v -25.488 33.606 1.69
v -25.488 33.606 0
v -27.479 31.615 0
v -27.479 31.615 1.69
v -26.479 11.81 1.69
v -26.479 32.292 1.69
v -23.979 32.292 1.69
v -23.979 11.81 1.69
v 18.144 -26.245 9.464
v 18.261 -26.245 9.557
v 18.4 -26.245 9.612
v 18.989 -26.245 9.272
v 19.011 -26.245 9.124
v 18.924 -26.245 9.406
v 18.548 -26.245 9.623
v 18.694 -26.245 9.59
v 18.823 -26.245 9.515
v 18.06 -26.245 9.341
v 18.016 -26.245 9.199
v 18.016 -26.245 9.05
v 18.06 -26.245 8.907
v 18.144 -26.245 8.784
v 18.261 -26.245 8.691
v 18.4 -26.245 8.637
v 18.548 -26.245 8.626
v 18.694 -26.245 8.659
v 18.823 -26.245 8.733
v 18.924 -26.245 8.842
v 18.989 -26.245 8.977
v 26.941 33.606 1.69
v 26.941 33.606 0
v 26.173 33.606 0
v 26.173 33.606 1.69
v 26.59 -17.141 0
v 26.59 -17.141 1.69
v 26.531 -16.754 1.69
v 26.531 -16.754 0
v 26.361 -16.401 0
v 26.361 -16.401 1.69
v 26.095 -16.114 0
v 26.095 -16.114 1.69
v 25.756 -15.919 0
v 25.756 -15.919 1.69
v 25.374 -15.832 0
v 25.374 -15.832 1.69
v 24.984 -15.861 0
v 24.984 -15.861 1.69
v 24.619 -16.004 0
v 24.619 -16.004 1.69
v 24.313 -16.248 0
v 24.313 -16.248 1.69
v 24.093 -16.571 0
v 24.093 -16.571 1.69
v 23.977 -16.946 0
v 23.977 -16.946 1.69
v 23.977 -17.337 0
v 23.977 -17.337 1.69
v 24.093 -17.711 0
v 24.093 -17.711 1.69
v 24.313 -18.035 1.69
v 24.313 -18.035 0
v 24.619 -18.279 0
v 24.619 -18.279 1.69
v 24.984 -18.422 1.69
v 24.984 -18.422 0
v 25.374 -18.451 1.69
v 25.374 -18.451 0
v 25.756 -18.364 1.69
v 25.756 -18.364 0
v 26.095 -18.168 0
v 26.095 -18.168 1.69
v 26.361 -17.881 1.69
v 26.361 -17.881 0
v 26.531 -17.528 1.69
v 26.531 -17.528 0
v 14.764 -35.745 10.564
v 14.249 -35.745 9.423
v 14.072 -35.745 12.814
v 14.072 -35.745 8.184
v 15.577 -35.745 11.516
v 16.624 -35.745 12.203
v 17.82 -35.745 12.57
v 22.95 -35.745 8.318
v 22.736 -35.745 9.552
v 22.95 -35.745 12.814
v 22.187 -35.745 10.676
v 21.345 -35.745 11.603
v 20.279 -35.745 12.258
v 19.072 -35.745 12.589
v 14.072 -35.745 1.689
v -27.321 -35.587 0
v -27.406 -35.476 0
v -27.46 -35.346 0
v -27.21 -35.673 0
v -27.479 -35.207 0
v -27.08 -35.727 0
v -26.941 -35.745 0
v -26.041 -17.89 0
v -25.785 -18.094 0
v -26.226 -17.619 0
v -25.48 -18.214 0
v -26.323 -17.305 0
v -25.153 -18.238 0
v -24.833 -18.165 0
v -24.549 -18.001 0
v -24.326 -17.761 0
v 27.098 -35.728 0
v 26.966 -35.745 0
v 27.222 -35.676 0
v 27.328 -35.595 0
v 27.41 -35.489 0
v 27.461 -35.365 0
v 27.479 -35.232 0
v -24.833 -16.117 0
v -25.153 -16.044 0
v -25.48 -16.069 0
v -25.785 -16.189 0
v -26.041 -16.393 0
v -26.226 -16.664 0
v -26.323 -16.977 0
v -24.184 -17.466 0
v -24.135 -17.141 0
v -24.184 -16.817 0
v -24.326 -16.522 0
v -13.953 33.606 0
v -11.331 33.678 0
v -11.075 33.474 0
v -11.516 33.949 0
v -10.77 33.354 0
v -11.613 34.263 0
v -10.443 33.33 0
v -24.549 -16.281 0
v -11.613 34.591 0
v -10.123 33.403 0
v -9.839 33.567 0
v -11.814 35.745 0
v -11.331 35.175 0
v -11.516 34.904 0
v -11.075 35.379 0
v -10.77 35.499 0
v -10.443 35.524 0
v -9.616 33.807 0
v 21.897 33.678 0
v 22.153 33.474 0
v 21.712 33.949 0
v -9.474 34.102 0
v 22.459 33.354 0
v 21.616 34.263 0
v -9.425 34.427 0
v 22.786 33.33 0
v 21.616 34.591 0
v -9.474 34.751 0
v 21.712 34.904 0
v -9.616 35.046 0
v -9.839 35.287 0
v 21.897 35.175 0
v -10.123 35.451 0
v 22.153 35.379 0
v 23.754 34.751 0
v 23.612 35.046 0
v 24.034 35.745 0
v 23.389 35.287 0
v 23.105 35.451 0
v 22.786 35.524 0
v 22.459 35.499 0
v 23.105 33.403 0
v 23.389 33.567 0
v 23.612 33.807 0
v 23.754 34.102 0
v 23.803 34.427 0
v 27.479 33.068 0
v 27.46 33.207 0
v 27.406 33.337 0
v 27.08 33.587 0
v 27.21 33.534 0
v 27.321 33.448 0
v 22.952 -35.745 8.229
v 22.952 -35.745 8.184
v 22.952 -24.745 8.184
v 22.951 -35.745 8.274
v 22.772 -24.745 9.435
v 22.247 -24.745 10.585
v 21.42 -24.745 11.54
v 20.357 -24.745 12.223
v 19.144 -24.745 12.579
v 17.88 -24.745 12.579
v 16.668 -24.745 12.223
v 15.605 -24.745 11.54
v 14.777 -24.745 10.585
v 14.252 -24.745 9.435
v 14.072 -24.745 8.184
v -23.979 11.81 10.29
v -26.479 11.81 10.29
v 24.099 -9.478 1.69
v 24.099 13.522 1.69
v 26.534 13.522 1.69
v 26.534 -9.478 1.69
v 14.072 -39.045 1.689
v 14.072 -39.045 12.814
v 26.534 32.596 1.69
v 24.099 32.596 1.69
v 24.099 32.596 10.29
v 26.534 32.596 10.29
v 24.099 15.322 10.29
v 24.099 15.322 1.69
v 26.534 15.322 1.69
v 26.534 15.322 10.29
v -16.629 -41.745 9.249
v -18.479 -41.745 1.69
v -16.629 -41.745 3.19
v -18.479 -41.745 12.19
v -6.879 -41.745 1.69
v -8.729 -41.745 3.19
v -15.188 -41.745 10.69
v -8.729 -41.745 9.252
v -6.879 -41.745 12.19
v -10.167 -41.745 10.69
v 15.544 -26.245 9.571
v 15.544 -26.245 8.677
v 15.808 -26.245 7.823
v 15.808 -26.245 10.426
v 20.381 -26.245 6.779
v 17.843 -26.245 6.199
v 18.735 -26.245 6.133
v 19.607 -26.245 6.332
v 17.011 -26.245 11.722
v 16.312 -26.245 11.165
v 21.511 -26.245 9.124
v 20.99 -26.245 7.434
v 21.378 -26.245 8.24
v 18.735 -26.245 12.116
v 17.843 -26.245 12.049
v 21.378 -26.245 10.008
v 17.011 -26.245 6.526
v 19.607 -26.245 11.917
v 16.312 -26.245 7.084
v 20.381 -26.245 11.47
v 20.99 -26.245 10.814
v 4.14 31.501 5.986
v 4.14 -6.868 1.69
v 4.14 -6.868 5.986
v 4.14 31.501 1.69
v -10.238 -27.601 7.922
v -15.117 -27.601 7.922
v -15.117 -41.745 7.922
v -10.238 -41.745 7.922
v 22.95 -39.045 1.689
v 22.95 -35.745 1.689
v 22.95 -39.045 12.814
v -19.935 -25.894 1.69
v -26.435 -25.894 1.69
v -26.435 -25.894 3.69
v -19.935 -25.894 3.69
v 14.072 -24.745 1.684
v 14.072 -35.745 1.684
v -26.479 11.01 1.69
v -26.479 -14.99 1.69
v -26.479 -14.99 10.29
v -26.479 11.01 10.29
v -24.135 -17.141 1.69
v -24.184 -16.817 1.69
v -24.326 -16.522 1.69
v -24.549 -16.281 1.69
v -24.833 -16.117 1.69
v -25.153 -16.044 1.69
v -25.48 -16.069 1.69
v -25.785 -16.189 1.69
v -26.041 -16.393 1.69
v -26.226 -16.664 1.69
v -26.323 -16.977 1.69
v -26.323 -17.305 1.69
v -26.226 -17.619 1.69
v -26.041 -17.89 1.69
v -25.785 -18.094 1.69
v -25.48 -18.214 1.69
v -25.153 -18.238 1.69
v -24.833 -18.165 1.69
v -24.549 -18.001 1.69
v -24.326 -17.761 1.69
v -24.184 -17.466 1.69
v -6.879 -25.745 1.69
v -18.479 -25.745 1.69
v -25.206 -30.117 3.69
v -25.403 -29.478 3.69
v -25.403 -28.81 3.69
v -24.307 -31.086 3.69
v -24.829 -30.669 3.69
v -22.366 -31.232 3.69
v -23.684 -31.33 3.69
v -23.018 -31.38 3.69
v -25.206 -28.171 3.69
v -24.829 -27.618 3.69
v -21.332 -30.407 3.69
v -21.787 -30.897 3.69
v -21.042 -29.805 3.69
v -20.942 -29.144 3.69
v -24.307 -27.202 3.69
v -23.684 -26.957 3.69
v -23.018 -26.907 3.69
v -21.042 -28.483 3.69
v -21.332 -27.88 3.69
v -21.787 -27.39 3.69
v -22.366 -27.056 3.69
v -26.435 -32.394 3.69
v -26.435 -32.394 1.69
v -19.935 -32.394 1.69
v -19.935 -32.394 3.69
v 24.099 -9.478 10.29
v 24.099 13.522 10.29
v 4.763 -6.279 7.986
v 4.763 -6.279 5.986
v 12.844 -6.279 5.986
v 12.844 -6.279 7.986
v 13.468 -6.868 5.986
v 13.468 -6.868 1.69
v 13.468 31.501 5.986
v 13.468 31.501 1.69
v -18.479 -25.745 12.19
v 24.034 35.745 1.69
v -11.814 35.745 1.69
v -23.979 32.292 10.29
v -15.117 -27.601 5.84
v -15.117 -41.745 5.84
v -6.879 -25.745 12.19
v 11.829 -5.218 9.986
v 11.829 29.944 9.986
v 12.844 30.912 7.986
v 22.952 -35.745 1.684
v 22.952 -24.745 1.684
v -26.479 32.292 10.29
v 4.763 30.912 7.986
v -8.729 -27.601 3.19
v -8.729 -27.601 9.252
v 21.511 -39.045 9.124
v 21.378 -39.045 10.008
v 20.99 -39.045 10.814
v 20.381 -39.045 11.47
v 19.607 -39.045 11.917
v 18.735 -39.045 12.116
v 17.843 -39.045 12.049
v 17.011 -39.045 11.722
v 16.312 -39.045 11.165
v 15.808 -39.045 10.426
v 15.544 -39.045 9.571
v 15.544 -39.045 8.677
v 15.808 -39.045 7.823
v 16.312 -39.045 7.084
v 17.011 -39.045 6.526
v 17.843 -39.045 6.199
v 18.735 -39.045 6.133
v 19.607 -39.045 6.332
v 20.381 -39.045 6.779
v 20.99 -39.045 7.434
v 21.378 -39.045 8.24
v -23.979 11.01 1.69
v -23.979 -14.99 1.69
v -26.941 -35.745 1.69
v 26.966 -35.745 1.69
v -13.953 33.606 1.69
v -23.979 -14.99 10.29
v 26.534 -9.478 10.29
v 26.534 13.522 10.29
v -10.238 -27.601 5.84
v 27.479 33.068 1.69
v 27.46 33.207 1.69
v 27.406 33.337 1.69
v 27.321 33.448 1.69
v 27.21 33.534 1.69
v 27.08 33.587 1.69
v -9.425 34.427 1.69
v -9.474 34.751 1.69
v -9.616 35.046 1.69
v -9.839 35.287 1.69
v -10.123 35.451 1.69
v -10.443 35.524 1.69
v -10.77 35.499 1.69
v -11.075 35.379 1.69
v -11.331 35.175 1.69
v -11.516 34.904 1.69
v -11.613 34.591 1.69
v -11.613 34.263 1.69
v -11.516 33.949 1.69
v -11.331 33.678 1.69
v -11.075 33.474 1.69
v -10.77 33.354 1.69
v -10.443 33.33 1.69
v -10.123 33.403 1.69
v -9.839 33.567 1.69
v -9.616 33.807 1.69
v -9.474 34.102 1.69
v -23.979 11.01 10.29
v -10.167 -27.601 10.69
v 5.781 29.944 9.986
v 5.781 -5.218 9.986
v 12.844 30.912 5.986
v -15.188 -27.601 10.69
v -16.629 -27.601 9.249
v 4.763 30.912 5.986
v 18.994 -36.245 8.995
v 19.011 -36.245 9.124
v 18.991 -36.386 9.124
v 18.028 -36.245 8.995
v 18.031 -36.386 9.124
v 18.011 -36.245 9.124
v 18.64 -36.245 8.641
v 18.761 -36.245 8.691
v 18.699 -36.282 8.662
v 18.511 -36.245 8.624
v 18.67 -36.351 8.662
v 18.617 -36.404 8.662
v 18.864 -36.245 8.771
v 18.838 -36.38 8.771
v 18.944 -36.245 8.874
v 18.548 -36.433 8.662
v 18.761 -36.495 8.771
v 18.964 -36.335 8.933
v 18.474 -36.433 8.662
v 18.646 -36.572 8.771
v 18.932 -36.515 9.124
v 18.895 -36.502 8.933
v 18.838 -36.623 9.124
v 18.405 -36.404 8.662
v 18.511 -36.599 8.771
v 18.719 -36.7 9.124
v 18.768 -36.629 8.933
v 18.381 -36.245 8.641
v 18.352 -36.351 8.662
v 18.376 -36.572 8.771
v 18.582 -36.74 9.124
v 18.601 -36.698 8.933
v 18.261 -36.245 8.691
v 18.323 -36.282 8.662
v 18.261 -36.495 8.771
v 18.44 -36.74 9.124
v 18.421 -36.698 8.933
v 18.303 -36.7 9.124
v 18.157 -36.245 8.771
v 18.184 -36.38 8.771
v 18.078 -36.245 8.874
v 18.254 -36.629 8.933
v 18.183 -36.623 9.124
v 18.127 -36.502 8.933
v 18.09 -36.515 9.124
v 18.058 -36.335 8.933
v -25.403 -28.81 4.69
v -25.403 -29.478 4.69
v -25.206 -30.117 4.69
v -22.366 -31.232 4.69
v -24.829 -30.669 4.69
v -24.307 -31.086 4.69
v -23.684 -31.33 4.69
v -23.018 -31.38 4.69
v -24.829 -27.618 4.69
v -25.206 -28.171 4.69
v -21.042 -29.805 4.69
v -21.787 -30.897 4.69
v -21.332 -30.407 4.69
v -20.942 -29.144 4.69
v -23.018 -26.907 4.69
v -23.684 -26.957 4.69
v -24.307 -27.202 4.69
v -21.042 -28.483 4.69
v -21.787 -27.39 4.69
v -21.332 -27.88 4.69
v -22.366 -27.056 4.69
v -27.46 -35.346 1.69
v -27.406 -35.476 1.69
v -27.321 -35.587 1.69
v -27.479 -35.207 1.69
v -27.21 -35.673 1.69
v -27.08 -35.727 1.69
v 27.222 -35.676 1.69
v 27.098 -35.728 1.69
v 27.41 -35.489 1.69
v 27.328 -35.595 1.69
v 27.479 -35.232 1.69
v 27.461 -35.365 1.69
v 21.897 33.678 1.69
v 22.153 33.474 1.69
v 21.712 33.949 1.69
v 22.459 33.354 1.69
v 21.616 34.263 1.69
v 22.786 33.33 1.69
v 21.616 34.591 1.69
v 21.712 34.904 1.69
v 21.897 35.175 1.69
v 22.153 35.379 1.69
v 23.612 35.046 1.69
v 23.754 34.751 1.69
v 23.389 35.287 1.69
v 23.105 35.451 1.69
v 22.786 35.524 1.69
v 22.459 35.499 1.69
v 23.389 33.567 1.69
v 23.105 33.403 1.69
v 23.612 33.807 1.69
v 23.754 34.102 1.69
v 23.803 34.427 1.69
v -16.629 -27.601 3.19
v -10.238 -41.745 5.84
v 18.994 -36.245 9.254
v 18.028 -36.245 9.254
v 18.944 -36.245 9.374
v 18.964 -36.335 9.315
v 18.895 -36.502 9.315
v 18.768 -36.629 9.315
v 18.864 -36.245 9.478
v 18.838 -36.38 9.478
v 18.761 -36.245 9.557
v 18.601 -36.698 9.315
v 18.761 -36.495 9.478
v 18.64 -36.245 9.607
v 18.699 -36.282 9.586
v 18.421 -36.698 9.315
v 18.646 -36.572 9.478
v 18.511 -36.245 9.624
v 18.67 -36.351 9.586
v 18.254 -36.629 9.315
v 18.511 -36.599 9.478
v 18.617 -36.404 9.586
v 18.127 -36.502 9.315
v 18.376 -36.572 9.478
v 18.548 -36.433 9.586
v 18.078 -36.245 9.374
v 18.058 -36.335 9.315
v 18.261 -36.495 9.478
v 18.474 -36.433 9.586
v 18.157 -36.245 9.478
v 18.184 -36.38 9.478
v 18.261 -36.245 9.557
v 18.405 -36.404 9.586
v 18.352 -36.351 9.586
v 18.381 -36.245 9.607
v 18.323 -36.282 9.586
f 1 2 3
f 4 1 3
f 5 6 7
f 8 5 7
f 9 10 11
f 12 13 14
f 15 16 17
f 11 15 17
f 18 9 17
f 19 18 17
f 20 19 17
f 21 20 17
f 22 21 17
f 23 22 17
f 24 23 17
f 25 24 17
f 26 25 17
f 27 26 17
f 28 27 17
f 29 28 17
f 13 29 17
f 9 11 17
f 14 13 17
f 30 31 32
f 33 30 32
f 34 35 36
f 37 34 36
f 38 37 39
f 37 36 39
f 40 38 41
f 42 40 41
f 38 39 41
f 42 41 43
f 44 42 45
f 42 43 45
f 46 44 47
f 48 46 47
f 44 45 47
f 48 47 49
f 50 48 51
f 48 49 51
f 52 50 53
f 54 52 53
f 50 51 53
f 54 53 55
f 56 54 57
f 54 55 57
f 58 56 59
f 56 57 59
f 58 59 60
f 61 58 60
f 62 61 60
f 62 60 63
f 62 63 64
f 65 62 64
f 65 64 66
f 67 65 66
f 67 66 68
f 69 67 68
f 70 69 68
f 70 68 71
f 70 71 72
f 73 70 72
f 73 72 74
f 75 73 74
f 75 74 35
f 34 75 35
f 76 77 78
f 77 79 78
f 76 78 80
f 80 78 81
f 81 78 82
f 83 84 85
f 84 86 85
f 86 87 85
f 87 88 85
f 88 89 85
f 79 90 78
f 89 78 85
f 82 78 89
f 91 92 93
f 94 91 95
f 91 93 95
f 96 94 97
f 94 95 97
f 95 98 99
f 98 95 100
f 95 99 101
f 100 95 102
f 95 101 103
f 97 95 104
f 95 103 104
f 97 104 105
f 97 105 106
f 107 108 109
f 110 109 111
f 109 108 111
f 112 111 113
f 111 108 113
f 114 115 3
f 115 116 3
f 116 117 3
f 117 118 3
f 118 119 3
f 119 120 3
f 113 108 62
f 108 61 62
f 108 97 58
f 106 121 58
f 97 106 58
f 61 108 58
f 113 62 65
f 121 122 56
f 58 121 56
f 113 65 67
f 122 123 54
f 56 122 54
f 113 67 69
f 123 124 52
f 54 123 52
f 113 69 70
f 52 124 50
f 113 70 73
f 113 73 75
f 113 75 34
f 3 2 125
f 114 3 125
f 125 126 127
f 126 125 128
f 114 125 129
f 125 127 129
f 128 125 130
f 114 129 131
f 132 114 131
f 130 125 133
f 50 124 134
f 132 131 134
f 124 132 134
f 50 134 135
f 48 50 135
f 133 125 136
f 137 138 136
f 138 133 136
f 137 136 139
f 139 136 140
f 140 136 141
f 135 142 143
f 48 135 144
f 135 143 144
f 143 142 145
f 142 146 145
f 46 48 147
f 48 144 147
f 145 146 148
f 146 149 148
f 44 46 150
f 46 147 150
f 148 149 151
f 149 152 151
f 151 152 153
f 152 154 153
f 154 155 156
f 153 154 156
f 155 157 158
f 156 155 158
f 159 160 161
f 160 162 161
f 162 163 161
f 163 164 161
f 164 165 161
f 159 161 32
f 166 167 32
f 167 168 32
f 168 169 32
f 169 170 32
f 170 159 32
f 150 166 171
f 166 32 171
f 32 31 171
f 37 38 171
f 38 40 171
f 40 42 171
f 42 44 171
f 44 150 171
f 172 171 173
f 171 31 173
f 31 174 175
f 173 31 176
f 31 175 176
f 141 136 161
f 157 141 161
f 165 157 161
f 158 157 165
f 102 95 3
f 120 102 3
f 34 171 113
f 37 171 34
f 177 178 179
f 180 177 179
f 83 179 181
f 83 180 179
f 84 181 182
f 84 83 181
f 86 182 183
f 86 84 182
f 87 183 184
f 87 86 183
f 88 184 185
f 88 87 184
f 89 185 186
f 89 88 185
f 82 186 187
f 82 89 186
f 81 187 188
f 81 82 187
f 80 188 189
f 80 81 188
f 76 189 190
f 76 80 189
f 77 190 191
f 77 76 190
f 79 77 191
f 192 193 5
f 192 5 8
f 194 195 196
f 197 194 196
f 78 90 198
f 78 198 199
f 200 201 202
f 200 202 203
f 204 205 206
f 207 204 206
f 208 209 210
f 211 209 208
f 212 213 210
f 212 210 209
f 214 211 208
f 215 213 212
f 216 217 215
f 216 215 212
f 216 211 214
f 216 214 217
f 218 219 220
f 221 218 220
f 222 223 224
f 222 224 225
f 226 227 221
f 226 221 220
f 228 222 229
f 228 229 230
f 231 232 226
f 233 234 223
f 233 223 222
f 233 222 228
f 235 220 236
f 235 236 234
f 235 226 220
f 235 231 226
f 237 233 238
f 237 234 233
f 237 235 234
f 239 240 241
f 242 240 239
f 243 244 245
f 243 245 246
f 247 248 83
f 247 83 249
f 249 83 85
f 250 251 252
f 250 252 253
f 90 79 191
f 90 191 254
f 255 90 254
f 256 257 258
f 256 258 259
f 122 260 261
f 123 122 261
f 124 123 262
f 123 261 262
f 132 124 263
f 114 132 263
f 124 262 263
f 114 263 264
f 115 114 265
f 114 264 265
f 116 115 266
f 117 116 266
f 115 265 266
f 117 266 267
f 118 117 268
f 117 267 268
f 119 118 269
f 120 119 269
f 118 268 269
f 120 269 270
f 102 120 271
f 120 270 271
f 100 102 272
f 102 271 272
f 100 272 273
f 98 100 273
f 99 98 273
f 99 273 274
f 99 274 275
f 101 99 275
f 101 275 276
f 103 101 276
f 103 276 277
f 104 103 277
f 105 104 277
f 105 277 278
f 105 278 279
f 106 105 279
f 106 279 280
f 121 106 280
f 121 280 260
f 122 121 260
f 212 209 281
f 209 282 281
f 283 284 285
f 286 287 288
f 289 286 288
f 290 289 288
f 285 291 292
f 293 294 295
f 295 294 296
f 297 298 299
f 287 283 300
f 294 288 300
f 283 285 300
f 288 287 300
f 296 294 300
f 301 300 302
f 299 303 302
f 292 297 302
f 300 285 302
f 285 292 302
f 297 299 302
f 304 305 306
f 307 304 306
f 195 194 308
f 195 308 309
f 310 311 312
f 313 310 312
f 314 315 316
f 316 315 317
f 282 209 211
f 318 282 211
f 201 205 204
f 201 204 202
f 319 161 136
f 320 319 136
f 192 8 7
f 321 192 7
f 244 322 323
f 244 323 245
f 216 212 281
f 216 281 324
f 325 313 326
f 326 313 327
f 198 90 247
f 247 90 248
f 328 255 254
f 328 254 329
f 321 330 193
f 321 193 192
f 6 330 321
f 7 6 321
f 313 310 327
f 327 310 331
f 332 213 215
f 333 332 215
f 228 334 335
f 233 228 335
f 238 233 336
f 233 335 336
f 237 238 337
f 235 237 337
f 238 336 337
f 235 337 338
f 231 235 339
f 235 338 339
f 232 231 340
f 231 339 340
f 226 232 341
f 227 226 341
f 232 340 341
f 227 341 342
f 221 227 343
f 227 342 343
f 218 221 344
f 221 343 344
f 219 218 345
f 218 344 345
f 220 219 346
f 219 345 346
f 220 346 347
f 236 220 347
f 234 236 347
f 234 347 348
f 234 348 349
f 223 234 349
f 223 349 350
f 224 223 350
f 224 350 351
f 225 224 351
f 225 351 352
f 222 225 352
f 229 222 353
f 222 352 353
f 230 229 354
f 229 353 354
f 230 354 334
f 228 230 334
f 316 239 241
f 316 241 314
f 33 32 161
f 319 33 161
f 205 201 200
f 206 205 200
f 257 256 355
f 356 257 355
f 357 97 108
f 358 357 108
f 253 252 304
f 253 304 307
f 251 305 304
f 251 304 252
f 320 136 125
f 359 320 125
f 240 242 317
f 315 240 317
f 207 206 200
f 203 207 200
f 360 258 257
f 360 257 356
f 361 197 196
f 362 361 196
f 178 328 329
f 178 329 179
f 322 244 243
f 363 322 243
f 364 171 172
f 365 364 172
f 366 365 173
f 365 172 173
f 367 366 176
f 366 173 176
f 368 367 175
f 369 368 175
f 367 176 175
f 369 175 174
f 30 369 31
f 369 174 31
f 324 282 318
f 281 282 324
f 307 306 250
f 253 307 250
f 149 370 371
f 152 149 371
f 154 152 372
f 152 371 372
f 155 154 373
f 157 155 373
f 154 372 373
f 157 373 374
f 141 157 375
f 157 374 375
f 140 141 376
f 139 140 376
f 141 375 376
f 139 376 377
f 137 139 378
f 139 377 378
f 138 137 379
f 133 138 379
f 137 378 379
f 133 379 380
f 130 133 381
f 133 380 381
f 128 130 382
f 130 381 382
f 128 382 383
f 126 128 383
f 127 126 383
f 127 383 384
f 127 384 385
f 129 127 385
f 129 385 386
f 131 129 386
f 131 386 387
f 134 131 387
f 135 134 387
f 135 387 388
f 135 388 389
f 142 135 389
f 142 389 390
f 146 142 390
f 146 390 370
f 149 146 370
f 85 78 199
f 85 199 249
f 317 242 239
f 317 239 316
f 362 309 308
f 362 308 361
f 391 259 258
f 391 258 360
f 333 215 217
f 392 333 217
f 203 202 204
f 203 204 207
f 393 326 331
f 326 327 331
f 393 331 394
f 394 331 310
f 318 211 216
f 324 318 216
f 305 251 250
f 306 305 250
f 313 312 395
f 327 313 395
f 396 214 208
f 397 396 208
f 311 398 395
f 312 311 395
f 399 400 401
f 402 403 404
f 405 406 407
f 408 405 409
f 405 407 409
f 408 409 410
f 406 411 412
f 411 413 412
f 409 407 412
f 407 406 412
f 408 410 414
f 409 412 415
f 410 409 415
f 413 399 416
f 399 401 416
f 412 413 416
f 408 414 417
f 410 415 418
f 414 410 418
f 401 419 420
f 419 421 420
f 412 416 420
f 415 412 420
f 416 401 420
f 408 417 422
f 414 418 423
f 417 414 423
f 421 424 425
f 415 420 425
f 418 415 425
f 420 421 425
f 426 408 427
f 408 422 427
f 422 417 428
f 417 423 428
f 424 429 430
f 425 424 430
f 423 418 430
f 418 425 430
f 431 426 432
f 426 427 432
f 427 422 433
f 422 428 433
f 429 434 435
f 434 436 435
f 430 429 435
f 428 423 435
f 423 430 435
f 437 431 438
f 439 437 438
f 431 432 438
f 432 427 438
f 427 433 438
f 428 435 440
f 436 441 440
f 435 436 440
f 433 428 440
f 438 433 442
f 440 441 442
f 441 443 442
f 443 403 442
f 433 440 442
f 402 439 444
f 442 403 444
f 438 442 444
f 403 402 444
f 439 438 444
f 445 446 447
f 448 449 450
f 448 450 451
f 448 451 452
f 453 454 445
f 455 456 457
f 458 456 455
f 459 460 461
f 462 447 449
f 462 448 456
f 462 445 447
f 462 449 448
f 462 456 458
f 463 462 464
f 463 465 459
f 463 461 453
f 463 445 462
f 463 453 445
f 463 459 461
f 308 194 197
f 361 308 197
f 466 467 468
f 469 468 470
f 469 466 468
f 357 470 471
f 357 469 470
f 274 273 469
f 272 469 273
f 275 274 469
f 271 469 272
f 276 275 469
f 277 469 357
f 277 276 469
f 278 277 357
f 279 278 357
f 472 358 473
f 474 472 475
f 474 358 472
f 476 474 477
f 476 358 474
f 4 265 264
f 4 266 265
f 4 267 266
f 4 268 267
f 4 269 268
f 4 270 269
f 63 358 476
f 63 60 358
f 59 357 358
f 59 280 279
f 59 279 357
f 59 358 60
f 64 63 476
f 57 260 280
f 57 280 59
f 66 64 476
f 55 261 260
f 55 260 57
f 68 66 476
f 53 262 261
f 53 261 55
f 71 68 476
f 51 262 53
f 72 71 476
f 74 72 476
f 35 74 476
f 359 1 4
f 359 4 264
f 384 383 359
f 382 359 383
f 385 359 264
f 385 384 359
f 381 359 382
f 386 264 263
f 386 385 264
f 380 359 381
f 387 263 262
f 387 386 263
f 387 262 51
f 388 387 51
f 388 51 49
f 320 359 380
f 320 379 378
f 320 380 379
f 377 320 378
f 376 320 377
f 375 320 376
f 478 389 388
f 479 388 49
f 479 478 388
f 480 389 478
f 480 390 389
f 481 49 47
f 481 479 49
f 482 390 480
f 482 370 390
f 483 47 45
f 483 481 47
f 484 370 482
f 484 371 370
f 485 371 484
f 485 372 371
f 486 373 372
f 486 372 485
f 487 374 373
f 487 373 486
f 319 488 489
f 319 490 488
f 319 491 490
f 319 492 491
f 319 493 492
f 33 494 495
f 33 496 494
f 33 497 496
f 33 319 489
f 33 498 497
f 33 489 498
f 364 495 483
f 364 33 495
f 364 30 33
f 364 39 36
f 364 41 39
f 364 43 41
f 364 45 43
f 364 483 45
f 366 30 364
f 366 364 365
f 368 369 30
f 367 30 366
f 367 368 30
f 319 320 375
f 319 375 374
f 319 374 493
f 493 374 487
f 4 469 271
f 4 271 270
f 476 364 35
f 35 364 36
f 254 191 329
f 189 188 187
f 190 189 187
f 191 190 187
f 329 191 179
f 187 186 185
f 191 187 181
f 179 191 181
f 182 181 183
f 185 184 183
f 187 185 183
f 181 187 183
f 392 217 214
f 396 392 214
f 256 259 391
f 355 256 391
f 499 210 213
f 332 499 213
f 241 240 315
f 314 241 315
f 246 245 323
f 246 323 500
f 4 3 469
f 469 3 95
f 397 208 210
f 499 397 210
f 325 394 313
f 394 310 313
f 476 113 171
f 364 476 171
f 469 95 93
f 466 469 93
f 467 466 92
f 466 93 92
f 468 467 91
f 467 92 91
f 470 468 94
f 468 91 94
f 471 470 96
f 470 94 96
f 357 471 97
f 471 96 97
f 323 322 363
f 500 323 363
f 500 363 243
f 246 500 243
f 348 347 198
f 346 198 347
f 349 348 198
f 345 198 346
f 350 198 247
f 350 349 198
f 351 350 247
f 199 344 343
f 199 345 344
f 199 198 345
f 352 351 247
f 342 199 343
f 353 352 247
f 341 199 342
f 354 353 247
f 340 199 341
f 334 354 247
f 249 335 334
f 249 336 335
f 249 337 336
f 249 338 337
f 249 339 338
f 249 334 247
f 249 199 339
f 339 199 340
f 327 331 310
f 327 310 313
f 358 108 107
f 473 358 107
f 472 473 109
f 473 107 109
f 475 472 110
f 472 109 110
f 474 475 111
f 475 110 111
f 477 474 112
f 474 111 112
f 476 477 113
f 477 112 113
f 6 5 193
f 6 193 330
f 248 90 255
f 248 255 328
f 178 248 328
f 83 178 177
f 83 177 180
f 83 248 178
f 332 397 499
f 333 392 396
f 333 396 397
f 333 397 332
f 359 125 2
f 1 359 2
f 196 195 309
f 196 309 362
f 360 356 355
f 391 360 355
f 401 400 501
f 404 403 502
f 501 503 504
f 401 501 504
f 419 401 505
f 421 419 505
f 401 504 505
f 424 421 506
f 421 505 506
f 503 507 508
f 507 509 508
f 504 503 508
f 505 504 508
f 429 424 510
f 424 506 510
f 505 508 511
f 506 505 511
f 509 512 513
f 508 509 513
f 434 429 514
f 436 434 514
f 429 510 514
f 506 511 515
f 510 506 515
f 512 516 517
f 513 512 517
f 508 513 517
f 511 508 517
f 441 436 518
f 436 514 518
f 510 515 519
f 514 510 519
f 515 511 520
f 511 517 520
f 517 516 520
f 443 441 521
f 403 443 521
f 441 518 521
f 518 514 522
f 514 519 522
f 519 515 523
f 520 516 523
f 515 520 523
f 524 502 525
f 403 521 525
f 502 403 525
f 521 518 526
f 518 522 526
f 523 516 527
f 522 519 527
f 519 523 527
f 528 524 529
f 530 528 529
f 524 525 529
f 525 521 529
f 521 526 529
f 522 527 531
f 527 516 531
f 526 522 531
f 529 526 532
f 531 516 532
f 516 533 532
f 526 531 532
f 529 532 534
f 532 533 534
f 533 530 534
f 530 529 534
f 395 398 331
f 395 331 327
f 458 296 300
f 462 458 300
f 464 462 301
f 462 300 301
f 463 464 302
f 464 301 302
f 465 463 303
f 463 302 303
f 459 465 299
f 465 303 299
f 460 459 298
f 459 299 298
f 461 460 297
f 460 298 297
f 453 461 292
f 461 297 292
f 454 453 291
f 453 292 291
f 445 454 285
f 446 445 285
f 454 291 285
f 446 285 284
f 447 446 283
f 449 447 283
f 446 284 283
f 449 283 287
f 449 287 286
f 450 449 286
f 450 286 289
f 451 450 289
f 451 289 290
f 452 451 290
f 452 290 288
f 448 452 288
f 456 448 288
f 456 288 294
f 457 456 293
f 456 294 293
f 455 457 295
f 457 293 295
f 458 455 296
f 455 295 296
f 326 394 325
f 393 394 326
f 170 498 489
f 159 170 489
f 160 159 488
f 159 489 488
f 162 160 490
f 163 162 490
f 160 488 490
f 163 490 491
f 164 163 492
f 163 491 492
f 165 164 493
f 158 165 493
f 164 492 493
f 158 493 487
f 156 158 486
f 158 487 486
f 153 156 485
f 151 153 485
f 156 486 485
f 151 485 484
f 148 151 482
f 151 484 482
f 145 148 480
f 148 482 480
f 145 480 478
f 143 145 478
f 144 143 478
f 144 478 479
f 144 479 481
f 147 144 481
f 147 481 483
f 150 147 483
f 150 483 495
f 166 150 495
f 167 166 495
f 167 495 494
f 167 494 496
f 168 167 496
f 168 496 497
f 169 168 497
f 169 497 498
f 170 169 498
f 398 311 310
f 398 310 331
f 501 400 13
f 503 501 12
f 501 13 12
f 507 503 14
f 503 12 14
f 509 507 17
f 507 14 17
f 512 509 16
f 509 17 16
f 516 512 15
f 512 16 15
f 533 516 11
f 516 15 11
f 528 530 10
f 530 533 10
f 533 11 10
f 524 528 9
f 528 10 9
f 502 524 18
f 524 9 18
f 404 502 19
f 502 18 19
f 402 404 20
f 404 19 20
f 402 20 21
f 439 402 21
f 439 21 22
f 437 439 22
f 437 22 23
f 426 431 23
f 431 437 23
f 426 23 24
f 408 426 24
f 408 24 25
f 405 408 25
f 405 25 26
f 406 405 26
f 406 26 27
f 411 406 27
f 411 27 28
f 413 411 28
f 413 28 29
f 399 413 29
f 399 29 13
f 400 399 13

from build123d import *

# Parameters (mm, degrees)
F1_DEPTH   = 1.69
F2_W       = 2.434945175
F2_H       = 23
F3_DEPTH   = 8.6
F2_H_2     = 17.2737486292
F2_W_2     = 2.5
F2_H_3     = 20.481327492
F2_H_4     = 26
F6_DEPTH   = 11
F7_W       = 8.87868274
F7_H       = 11.1249446636
F8_DEPTH   = 3.3
F9_R       = 3
F10_DEPTH  = 12.8
F11_R      = 0.5
F12_DEPTH  = 10
F13_W      = 11.6
F13_H      = 10
F14_DEPTH  = 10.5
F15_W      = 11.6
F15_H      = 10.5
F16_DEPTH  = 6
F18_DEPTH  = 14.14393
F19_W      = 4.8785965383
F19_H      = 2.0820805803
F20_DEPTH  = 14.14393
F21_W      = 6.5
F21_H      = 6.5
F22_DEPTH  = 2
F23_R      = 2.2427667378
F24_DEPTH  = 1
F25_W      = 9.3276520822
F25_H      = 38.3693373368
F26_DEPTH  = 4.29568
F27_W      = 8.0811752376
F27_H      = 37.1907090231
F28_DEPTH  = 2
F30_W      = 6.0478351079
F30_H      = 35.1617564447
F28_FACE_W = 8.0811752376
F28_FACE_H = 37.1907090231
F32_R      = 1.1
F33_DEPTH  = 1.691
F34_R      = 1.1
F34_R_2    = 1.3134018391
F35_DEPTH  = 1.691
F37_ANGLE  = 180


with BuildPart() as f1:
    # F0 (on Top) → F1 (new body)
    with BuildSketch(Plane.XY):
        with BuildLine():
            Line((24.0339115262, 35.744994029), (-11.8138234477, 35.744994029))
            Line((-11.8138234477, 35.744994029), (-13.952996046, 33.6058214307))
            Line((-13.952996046, 33.6058214307), (-25.4879149359, 33.6058214307))
            Line((-25.4879149359, 33.6058214307), (-27.4785661542, 31.6151702124))
            Line((-27.4785661542, 31.6151702124), (-27.4785661542, -35.2069868512))
            ThreePointArc((-27.4785661542, -35.2069868512), (-27.3209875002, -35.5874153749), (-26.9405589764, -35.744994029))
            Line((-26.9405589764, -35.744994029), (26.9657578724, -35.744994029))
            ThreePointArc((26.9657578724, -35.744994029), (27.3283680859, -35.5947959607), (27.4785661542, -35.2321857471))
            Line((27.4785661542, -35.2321857471), (27.4785661542, 33.0678142529))
            ThreePointArc((27.4785661542, 33.0678142529), (27.3209875002, 33.4482427766), (26.9405589764, 33.6058214307))
            Line((26.9405589764, 33.6058214307), (26.1730841245, 33.6058214307))
            Line((26.1730841245, 33.6058214307), (24.0339115262, 35.744994029))
        make_face()
    extrude(amount=F1_DEPTH)

    # F32 (on face) → F33 (cut, through all)
    with BuildSketch(Plane.XY.offset(1.69)):
        with Locations((-10.5248941109, 34.4266854227)):
            Circle(F32_R)
        with Locations((22.7033495903, 34.4266854227)):
            Circle(F32_R)
    extrude(amount=-F33_DEPTH, mode=Mode.SUBTRACT)

    # F34 (on face) → F35 (cut, through all)
    with BuildSketch(Plane.XY.offset(1.69)):
        with Locations((-25.2349545183, -17.141347751)):
            Circle(F34_R)
        with Locations((25.2761915326, -17.141347751)):
            Circle(F34_R_2)
    extrude(amount=-F35_DEPTH, mode=Mode.SUBTRACT)


with BuildPart() as f3:
    # F2 (on face) → F3 (new body)
    with BuildSketch(Plane.XY.offset(1.69)):
        with Locations((25.316230242, 2.0224055983)):
            Rectangle(F2_W, F2_H)
    extrude(amount=F3_DEPTH)


with BuildPart() as f3b:
    # F2 (on face) → F3, piece 2 (new body)
    with BuildSketch(Plane.XY.offset(1.69)):
        with Locations((25.316230242, 23.9592799129)):
            Rectangle(F2_W, F2_H_2)
    extrude(amount=F3_DEPTH)


with BuildPart() as f3c:
    # F2 (on face) → F3, piece 3 (new body)
    with BuildSketch(Plane.XY.offset(1.69)):
        with Locations((-25.2285661542, 22.0511595675)):
            Rectangle(F2_W_2, F2_H_3)
    extrude(amount=F3_DEPTH)


with BuildPart() as f3d:
    # F2 (on face) → F3, piece 4 (new body)
    with BuildSketch(Plane.XY.offset(1.69)):
        with Locations((-25.2285661542, -1.9895041785)):
            Rectangle(F2_W_2, F2_H_4)
    extrude(amount=F3_DEPTH)


with BuildPart() as f6:
    # F5 (on offset) → F6 (new body)
    with BuildSketch(Plane.XZ.offset(35.744994029)):
        with BuildLine():
            Line((14.0722493033, 1.6842637178), (22.9522493033, 1.6842637178))
            Line((22.9522493033, 1.6842637178), (22.9522493033, 8.1842637178))
            ThreePointArc((22.9522493033, 8.1842637178), (18.5122493033, 12.6242637178), (14.0722493033, 8.1842637178))
            Line((14.0722493033, 8.1842637178), (14.0722493033, 1.6842637178))
        make_face()
    extrude(amount=-F6_DEPTH)

    # F7 (on offset) → F8 (join)
    with BuildSketch(Plane.XZ.offset(35.744994029)):
        with Locations((18.5108794831, 7.2514217463)):
            Rectangle(F7_W, F7_H)
    extrude(amount=F8_DEPTH)

    # F9 (on face) → F10 (cut)
    with BuildSketch(Plane.XZ.offset(39.044994029)):
        with Locations((18.5108794831, 9.124157019)):
            Circle(F9_R)
    extrude(amount=-F10_DEPTH, mode=Mode.SUBTRACT)


with BuildPart() as f12:
    # F11 (on face) → F12 (new body)
    with BuildSketch(Plane.XZ.offset(26.244994029)):
        with Locations((18.5108794831, 9.124157019)):
            Circle(F11_R)
    extrude(amount=F12_DEPTH)

    # F36 (on face) → F37 (revolve)
    with BuildSketch(Plane.XZ.offset(36.244994029)):
        with BuildLine():
            ThreePointArc((19.0108794831, 9.124157019), (18.8644328737, 9.4777104096), (18.5108794831, 9.624157019))
            Line((18.5108794831, 9.624157019), (18.5108794831, 8.624157019))
            ThreePointArc((18.5108794831, 8.624157019), (18.8644328737, 8.7706036284), (19.0108794831, 9.124157019))
        make_face()
    revolve(axis=Axis((18.5108794831, -36.244994029, 9.124157019), (0, 0, -1)), revolution_arc=F37_ANGLE)


with BuildPart() as f14:
    # F13 (on face) → F14 (new body)
    with BuildSketch(Plane.XY.offset(1.69)):
        with Locations((-12.6785661542, -30.744994029)):
            Rectangle(F13_W, F13_H)
    extrude(amount=F14_DEPTH)

    # F15 (on face) → F16 (join)
    with BuildSketch(Plane.XZ.offset(35.744994029)):
        with Locations((-12.6785661542, 6.94)):
            Rectangle(F15_W, F15_H)
    extrude(amount=F16_DEPTH)

    # F17 (on face) → F18 (cut)
    with BuildSketch(Plane.XZ.offset(41.744994029)):
        Polygon((-16.6285661542, 9.2491237447), (-16.6285661542, 3.19), (-8.7285661542, 3.19), (-8.7285661542, 9.2515923473), (-10.1669738069, 10.69), (-15.1876898989, 10.69), align=None)
    extrude(amount=-F18_DEPTH, mode=Mode.SUBTRACT)


with BuildPart() as f20:
    # F19 (on face) → F20 (new body, through all)
    with BuildSketch(Plane.XZ.offset(27.601064029)):
        with Locations((-12.6773318529, 6.8805450574)):
            Rectangle(F19_W, F19_H)
    extrude(amount=F20_DEPTH)


with BuildPart() as f22:
    # F21 (on face) → F22 (new body)
    with BuildSketch(Plane.XY.offset(1.69)):
        with Locations((-23.1851451099, -29.143884778)):
            Rectangle(F21_W, F21_H)
    extrude(amount=F22_DEPTH)


with BuildPart() as f24:
    # F23 (on face) → F24 (new body)
    with BuildSketch(Plane.XY.offset(3.69)):
        with Locations((-23.1851451099, -29.143884778)):
            Circle(F23_R)
    extrude(amount=F24_DEPTH)


with BuildPart() as f26:
    # F25 (on face) → F26 (new body)
    with BuildSketch(Plane.XY.offset(1.69)):
        with Locations((8.8037233053, 12.316826851)):
            Rectangle(F25_W, F25_H)
    extrude(amount=F26_DEPTH)


with BuildPart() as f28:
    # F27 (on face) → F28 (new body)
    with BuildSketch(Plane.XY.offset(5.98568)):
        with Locations((8.8037233053, 12.316826851)):
            Rectangle(F27_W, F27_H)
    extrude(amount=F28_DEPTH)


with BuildPart() as f31:
    # F30 (on offset) → F31 section 0
    with BuildSketch(Plane.XY.offset(9.98568)):
        with Locations((8.8047666941, 12.3632361647)):
            Rectangle(F30_W, F30_H)
    # F28_face (on face) → F31 section 1
    with BuildSketch(Plane(origin=(8.8037233053, 12.316826851, 7.98568), x_dir=(1, 0, 0), z_dir=(0, 0, 1))):
        Rectangle(F28_FACE_W, F28_FACE_H)
    loft()


solid = Compound([f1.part, f3.part, f3b.part, f3c.part, f3d.part, f6.part, f12.part, f14.part, f20.part, f22.part, f24.part, f26.part, f28.part, f31.part])
